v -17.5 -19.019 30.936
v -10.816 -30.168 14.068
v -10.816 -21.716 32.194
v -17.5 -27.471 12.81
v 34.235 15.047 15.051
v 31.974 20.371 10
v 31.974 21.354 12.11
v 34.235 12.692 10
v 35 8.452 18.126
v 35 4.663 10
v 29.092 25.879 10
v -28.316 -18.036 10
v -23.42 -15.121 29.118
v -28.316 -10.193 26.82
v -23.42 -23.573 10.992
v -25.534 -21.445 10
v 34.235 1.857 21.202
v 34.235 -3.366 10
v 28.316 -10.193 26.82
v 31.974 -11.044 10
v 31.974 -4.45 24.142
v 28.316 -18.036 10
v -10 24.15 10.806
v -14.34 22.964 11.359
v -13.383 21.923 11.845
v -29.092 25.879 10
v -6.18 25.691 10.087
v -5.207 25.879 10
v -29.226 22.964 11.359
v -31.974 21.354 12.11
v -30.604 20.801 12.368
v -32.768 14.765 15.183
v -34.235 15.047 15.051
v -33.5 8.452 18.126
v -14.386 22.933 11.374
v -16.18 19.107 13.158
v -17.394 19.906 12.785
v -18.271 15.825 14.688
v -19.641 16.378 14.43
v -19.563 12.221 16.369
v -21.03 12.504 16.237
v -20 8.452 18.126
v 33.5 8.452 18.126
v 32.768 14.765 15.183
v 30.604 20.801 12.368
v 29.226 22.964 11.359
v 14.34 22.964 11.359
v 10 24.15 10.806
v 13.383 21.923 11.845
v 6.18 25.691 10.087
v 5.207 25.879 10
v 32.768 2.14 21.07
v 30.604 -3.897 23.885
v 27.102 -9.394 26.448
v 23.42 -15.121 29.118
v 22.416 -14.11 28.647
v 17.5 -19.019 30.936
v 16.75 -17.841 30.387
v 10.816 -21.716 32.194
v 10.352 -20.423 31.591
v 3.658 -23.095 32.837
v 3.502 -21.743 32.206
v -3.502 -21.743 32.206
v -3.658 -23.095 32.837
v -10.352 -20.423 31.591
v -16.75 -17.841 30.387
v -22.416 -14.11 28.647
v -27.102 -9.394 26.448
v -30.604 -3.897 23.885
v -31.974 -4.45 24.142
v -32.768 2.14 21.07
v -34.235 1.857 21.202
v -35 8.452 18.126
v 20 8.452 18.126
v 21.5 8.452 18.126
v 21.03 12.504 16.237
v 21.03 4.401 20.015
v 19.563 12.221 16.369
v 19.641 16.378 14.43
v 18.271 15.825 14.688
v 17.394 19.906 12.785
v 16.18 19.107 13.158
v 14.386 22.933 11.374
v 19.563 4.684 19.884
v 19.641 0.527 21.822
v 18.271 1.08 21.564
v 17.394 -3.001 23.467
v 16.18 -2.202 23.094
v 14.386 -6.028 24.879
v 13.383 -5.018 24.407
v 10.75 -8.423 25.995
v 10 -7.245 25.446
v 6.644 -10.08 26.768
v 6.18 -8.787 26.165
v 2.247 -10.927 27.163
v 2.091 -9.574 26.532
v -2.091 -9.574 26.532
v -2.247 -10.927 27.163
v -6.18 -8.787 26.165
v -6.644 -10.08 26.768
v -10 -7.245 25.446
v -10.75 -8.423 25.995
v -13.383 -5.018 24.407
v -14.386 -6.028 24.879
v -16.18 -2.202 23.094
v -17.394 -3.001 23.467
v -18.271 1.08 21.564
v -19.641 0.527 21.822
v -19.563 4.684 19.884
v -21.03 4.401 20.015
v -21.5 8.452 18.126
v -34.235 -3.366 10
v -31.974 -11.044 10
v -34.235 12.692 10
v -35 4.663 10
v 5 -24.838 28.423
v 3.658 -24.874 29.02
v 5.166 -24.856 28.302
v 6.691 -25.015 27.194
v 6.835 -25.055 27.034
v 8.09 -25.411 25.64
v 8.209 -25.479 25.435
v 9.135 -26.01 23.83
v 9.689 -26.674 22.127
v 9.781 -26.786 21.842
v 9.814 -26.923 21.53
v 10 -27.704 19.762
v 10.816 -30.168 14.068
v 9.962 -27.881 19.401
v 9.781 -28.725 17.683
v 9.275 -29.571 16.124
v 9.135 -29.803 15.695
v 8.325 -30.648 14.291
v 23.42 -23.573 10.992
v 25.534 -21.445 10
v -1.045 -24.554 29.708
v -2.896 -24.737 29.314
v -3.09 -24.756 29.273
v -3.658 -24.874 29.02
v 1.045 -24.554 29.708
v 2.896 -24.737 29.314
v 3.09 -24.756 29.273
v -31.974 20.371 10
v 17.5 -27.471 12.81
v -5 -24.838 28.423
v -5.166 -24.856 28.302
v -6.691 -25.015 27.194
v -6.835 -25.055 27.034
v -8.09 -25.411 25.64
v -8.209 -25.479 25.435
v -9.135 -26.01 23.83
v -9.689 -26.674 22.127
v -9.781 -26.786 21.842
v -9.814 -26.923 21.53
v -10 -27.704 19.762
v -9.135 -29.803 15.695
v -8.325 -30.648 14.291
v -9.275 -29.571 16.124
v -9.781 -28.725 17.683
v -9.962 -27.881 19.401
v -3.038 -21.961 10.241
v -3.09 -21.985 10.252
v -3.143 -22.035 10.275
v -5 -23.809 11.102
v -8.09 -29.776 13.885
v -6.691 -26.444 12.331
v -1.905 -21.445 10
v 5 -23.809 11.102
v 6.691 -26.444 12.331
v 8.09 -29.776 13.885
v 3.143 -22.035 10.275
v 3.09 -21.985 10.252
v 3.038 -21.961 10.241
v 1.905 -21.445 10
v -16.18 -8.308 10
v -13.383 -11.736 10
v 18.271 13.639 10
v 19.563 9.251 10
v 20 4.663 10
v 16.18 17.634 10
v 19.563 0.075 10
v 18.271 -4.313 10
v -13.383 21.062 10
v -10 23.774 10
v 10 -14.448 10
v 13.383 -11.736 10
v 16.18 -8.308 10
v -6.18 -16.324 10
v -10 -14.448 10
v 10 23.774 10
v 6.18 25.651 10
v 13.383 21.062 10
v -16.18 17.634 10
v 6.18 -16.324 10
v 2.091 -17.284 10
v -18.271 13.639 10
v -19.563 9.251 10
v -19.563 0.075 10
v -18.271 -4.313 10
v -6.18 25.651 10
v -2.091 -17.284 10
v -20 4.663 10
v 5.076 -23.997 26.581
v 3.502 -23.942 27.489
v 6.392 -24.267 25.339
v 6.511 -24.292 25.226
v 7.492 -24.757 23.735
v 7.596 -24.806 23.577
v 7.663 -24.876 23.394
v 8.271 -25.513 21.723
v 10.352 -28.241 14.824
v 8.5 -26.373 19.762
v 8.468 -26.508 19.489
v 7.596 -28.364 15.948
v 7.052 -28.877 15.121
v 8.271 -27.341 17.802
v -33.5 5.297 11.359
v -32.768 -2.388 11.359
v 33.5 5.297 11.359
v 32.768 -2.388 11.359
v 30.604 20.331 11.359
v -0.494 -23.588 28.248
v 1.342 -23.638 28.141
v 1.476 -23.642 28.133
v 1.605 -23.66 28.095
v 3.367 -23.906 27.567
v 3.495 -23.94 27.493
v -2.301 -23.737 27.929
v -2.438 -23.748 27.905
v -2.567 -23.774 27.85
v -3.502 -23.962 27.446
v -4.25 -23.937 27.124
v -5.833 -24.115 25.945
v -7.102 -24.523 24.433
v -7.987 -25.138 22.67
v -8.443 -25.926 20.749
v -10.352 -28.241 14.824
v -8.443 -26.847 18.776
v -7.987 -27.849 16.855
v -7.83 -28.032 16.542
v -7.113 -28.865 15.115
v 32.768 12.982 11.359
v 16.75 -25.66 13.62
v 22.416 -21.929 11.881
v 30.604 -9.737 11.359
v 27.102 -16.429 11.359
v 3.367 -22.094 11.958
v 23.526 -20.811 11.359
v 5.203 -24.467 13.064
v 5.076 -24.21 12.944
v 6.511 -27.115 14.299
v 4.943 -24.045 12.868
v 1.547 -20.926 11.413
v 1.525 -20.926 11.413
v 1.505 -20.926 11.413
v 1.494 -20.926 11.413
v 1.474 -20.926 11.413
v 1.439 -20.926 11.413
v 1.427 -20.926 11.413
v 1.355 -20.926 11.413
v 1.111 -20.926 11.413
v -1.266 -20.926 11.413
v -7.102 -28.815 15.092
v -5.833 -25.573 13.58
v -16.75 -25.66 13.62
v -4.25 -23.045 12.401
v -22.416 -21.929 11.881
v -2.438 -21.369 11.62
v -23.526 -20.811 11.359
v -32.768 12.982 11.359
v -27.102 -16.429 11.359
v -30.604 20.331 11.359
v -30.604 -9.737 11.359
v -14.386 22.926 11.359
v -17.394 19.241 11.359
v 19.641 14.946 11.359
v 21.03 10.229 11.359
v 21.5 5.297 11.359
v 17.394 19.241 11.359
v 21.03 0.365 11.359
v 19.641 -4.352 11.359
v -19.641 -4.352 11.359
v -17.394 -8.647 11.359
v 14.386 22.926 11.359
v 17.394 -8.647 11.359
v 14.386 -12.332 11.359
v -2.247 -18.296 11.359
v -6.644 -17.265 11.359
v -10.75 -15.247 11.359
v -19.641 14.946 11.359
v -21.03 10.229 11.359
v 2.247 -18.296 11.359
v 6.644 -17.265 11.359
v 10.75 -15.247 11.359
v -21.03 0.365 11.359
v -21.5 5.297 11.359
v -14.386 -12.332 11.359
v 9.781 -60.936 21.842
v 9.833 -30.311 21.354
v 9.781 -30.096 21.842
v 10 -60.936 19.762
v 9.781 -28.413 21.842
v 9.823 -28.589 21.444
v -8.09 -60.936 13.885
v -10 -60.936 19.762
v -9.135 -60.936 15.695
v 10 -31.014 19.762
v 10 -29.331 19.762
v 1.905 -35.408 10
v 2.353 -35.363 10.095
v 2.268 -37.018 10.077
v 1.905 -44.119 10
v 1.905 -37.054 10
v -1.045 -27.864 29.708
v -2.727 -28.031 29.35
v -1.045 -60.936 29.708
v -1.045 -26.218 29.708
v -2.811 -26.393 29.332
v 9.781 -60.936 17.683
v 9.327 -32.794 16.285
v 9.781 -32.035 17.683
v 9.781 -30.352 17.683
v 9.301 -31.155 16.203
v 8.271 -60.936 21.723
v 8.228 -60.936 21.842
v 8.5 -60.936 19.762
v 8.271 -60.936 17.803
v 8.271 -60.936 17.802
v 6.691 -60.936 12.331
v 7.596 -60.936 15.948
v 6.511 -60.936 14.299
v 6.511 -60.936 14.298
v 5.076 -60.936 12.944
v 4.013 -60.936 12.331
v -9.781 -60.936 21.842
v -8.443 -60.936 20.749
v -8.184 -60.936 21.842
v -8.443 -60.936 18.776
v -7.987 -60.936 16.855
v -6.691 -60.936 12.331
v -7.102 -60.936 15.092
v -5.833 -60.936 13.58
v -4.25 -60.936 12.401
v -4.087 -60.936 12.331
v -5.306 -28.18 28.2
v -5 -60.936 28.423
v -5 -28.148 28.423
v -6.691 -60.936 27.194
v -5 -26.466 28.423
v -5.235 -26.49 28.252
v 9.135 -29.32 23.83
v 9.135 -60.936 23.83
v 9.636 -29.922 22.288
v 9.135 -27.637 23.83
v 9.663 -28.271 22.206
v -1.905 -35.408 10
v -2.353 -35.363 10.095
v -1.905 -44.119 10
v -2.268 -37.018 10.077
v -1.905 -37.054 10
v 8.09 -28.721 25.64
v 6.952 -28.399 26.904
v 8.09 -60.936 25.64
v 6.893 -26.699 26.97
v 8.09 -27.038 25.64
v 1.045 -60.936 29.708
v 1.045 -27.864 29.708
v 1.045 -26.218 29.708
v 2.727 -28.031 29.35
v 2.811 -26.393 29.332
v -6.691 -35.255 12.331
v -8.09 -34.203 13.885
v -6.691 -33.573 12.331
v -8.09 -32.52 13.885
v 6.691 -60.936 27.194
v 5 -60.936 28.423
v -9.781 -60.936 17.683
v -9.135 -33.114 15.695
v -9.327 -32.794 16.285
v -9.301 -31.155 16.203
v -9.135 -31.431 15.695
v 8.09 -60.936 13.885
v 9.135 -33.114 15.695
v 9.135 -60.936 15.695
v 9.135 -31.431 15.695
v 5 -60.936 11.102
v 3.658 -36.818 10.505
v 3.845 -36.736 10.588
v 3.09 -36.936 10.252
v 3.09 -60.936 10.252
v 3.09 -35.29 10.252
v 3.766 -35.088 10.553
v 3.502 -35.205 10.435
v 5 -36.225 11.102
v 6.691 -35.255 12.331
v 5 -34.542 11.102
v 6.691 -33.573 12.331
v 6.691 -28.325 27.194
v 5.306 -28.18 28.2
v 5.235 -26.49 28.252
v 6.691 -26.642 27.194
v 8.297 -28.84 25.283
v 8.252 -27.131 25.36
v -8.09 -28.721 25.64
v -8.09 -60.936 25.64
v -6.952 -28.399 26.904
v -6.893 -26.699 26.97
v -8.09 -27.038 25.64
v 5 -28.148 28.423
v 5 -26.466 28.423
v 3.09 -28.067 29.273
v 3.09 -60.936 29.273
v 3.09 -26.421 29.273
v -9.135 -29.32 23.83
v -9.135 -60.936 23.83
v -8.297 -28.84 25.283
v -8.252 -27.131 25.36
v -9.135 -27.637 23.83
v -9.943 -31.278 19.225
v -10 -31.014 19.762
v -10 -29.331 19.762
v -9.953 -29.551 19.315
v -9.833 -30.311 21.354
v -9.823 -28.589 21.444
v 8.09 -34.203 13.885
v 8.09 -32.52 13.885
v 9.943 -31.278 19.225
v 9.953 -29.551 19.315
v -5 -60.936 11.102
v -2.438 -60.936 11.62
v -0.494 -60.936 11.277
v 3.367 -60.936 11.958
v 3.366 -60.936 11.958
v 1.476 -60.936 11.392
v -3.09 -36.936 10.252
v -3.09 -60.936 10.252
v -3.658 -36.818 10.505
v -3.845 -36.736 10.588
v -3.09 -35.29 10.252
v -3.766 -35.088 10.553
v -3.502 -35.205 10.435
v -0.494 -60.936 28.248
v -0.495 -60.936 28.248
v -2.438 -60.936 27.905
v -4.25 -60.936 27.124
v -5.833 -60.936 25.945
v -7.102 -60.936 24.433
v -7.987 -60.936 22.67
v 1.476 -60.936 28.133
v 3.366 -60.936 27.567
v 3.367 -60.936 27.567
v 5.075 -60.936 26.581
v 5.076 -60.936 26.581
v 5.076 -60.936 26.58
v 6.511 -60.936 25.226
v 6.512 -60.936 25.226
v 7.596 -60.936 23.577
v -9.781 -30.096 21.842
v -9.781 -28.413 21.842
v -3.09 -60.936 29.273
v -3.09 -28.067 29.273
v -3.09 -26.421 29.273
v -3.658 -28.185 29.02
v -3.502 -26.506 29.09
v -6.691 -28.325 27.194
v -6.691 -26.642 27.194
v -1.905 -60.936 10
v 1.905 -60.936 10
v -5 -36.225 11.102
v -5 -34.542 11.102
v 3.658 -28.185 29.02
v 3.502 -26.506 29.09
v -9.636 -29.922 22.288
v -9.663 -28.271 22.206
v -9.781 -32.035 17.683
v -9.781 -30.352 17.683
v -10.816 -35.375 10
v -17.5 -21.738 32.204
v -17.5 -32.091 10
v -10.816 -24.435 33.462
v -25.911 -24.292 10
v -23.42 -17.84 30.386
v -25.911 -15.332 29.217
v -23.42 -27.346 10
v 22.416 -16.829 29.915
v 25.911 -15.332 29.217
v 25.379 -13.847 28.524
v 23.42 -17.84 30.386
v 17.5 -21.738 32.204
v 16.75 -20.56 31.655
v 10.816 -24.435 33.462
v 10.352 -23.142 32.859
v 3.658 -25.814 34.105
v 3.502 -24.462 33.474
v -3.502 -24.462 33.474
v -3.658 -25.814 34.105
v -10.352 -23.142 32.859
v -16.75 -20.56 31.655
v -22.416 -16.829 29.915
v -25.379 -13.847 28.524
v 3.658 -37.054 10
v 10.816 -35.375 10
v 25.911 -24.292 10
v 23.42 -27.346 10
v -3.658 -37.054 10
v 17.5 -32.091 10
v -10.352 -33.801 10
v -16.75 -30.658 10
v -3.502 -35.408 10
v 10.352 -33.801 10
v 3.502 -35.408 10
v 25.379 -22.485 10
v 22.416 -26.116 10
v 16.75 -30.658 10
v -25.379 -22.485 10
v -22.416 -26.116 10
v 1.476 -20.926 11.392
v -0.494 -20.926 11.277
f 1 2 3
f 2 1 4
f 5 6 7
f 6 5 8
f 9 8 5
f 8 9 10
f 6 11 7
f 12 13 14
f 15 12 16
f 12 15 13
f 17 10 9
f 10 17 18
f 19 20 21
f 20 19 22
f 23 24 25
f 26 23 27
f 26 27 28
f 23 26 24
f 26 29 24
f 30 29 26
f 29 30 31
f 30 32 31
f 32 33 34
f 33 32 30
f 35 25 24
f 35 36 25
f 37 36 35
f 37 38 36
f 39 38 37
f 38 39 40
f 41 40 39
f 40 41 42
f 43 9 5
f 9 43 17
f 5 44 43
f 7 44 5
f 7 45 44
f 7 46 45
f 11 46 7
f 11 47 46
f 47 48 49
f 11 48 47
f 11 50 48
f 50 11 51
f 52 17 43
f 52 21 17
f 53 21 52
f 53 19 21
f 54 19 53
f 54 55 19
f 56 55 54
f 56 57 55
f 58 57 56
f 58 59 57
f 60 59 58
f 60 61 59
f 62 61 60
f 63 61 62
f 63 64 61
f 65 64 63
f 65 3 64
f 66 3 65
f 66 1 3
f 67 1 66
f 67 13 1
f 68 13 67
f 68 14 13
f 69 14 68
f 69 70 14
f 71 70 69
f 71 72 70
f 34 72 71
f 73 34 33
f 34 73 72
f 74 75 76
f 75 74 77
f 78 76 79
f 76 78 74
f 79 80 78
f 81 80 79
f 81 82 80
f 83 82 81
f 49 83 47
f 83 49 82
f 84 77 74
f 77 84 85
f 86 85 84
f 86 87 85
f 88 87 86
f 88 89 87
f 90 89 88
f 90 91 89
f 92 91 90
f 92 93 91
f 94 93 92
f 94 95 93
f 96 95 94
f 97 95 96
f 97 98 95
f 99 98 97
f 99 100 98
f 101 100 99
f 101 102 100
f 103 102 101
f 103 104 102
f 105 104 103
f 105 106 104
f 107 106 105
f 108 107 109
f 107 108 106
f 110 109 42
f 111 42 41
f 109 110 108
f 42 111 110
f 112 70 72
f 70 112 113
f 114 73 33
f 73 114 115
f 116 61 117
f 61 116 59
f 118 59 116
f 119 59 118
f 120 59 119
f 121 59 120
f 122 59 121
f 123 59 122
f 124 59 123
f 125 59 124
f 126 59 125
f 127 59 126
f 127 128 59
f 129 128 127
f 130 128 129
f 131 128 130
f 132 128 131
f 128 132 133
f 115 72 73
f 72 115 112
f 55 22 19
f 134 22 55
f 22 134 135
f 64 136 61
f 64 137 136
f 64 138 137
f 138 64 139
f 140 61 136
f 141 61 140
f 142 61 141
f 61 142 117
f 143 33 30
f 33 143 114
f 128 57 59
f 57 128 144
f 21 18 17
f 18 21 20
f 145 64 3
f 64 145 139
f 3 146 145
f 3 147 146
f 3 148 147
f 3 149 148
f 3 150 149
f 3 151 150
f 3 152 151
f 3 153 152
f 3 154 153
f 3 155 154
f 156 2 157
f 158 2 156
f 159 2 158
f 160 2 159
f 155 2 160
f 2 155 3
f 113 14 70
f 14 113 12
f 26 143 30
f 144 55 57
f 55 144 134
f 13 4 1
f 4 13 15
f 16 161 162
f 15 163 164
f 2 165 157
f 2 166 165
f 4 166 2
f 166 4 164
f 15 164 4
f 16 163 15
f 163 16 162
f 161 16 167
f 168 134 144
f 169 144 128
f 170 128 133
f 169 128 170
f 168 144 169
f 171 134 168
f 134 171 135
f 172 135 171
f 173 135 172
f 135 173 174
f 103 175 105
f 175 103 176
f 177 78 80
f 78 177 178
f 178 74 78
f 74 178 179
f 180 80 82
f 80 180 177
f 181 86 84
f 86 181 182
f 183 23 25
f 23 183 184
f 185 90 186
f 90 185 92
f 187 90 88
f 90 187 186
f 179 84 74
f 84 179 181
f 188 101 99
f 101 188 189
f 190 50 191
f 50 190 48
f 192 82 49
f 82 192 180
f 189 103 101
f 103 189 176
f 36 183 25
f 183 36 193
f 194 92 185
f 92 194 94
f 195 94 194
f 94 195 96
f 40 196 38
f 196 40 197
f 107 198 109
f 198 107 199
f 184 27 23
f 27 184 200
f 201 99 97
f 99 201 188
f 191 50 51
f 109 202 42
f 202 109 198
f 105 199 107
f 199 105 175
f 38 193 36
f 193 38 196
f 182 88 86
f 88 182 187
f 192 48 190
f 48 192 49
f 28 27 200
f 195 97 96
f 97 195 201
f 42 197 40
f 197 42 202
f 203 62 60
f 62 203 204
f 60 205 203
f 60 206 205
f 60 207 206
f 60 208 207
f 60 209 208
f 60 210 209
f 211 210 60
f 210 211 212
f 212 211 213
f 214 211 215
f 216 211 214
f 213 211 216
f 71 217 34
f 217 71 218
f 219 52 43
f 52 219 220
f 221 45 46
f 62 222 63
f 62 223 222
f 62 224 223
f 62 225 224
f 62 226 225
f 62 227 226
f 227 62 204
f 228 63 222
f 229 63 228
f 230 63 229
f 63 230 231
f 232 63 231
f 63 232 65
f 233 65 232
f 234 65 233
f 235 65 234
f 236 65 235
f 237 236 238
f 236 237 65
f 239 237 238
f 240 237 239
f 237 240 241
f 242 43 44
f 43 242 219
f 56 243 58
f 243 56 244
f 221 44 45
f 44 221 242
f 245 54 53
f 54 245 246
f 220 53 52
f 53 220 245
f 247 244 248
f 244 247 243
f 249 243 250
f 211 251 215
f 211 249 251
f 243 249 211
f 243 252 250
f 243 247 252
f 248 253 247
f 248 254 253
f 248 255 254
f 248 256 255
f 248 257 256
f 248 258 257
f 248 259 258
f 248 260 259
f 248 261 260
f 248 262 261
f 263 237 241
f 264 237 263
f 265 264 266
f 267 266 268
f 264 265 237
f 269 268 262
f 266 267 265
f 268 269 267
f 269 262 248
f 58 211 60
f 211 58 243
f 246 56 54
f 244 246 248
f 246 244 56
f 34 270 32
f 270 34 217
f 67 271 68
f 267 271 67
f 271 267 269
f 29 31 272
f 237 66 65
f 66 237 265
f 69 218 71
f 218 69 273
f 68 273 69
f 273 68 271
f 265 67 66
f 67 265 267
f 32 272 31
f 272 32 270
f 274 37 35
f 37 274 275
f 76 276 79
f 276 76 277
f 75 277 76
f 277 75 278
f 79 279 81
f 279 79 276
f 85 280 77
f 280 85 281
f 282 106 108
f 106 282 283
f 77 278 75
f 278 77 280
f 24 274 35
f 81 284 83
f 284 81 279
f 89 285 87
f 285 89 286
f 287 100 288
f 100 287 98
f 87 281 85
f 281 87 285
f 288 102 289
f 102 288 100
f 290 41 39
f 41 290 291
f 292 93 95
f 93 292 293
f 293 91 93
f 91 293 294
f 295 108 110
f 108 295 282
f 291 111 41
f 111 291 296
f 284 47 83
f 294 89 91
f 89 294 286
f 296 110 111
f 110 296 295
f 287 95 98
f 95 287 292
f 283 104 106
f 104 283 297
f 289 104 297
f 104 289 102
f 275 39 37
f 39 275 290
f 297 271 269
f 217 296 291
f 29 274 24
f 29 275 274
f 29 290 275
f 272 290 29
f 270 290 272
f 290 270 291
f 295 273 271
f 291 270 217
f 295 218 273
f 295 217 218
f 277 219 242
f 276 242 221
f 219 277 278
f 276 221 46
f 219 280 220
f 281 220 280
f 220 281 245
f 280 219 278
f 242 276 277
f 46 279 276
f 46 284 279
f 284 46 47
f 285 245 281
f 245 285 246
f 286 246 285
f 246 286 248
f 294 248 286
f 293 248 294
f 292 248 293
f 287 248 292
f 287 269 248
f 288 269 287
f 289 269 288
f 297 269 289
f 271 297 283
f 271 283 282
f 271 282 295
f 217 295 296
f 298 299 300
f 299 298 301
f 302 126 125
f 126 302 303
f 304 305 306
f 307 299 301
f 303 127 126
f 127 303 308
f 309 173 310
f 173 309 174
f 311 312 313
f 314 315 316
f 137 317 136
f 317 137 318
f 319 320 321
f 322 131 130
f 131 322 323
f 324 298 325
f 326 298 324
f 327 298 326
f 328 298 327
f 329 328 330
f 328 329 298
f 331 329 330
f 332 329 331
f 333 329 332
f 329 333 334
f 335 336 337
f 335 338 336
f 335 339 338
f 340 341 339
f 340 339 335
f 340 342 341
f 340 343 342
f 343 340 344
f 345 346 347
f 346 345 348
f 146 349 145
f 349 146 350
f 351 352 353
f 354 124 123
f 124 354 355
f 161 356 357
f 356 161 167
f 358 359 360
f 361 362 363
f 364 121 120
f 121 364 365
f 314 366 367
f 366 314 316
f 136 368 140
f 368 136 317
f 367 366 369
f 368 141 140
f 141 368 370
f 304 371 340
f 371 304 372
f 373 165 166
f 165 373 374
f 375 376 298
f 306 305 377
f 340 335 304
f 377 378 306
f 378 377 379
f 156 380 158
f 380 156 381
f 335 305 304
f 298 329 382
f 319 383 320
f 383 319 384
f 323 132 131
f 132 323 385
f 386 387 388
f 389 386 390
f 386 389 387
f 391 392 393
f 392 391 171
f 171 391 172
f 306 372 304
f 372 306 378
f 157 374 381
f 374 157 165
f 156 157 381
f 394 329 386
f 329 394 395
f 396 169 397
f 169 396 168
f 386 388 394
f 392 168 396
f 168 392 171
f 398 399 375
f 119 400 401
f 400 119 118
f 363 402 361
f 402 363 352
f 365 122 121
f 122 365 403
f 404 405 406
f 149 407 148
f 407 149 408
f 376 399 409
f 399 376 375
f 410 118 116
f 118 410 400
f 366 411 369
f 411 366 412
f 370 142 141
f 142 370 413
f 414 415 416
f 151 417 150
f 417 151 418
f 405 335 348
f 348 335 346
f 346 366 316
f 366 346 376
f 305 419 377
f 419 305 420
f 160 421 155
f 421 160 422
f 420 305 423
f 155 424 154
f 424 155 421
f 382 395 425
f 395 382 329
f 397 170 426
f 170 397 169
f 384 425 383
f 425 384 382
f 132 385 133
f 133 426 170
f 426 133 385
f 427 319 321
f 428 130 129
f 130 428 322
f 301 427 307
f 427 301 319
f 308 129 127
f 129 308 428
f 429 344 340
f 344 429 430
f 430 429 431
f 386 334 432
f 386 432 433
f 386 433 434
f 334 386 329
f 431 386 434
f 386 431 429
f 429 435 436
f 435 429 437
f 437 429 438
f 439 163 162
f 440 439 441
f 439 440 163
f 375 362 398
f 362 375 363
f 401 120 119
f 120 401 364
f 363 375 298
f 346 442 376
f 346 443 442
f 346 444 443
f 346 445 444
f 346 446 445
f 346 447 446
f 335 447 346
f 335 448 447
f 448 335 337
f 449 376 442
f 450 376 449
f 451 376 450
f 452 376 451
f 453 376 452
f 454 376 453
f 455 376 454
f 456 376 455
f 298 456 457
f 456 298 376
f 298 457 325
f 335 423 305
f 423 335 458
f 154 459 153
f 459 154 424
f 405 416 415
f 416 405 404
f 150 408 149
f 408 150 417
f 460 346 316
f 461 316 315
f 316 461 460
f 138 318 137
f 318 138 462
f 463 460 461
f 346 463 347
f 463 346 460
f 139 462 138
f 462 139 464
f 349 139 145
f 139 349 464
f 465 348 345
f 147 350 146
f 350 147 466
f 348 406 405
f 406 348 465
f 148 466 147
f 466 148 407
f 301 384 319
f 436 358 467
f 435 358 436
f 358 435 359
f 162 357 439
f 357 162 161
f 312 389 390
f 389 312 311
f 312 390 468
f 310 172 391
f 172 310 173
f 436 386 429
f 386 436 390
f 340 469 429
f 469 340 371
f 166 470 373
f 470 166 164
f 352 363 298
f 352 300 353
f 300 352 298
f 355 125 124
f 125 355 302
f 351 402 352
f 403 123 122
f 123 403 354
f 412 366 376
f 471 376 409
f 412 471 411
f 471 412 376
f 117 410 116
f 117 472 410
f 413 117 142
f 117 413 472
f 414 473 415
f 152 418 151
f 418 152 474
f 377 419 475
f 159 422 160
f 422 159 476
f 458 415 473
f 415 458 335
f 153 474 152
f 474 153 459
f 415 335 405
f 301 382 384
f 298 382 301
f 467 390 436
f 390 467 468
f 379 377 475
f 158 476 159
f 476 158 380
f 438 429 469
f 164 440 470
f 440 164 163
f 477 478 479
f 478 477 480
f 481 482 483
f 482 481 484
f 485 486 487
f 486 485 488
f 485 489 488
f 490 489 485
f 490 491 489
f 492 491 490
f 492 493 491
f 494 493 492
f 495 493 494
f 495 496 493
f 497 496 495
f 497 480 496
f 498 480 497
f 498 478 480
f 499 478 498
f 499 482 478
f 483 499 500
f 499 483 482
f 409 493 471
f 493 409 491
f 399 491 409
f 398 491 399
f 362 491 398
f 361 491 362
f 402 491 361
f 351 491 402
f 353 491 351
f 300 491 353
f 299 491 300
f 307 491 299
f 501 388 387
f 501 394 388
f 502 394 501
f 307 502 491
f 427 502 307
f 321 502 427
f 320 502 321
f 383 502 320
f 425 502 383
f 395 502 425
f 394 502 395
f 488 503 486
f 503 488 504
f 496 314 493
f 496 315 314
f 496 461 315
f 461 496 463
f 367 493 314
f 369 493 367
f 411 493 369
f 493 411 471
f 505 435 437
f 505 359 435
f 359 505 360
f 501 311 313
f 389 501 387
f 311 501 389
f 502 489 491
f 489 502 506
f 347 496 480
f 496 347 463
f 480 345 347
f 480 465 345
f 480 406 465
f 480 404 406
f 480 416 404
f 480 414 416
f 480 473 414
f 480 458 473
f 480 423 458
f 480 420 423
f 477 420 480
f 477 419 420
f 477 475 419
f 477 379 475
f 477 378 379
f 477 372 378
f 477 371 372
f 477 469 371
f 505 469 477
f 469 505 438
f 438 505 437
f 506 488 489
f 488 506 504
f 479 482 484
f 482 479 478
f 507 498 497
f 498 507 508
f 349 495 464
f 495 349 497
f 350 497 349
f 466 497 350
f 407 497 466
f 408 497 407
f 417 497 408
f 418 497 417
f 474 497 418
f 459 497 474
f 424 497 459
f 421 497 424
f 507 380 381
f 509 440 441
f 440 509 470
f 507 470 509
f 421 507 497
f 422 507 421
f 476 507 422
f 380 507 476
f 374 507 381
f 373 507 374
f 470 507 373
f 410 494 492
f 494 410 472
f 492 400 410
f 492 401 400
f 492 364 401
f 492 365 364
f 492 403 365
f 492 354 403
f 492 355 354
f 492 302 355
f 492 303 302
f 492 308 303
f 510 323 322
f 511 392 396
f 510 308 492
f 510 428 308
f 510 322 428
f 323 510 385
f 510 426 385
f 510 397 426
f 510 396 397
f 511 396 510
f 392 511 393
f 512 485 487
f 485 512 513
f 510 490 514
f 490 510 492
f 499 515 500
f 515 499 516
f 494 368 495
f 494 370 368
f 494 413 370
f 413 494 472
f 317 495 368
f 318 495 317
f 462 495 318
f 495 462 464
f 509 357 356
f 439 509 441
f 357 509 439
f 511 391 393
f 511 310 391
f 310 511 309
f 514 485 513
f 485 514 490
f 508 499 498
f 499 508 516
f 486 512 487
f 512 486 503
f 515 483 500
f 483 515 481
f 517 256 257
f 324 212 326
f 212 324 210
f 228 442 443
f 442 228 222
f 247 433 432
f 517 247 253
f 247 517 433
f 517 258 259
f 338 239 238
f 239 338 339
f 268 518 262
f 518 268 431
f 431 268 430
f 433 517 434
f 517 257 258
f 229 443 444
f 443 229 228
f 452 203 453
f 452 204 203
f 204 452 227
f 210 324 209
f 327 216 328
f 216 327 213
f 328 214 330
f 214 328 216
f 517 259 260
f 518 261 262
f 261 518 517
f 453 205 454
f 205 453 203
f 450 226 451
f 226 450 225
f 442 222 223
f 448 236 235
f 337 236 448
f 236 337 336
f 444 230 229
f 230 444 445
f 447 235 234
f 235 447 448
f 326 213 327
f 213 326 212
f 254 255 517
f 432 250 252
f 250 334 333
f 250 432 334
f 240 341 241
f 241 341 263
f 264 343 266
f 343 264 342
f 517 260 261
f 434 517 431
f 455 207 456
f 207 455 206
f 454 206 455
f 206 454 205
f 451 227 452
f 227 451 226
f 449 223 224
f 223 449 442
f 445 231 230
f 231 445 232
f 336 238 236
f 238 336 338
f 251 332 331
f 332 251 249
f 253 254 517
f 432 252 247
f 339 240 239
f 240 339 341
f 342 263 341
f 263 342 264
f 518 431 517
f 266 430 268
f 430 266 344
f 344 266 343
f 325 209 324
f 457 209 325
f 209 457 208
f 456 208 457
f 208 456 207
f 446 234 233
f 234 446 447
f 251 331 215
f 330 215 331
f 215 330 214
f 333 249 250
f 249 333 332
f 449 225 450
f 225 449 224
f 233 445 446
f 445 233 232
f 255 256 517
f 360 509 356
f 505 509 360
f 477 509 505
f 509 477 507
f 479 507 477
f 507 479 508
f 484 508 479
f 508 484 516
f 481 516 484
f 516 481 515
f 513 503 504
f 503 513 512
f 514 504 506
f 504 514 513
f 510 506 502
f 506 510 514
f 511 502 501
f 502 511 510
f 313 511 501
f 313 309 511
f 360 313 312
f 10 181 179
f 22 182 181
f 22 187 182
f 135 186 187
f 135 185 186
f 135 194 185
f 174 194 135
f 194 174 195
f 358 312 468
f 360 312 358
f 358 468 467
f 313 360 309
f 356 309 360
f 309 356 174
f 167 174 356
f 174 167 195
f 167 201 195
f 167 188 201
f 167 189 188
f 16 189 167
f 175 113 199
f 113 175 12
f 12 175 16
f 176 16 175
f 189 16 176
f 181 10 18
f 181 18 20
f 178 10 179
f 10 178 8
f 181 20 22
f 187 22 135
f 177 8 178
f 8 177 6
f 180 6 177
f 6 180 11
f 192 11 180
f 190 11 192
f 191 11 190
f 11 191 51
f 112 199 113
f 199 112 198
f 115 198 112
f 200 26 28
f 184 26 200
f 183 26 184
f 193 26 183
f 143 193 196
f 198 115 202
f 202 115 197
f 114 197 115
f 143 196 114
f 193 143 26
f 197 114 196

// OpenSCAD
outer_diameter = 70;
wall_thickness = 1.5;
width = 15;
height = 20;
thin = 0.01;
angle = 25;

/* d = height / tan(angle);
p = (outer_diameter - d)/2; */
p=outer_diameter * 0.33;

rotate([-angle, 0, 0]) {
  assembly();
}

module mantle(){
  intersection(){
    translate([0,-outer_diameter/2,-height/2-thin])
      cylinder(d=outer_diameter-width, h=height*2);
    translate([0,-wall_thickness*2,-height/2])
      difference(){
        cylinder(d=outer_diameter,h=height*1.5);
        translate([0,0,-thin])
          cylinder(d=outer_diameter-wall_thickness*2,h=height*2);
      }
  }
}

module assembly(){
  difference() {
    union() {
      ringcup();
      outlet();
      mantle();
    }
    outlet_inner();
    cutoff();
  }

}

module outlet_inner(){
  translate([0,-p,0])
    rotate([90+angle,0,0])
      translate([0,height/2,0])
        translate([0,0,-thin])
          cylinder(d=height-wall_thickness*2,h=height*2+thin*2);
}

module outlet(){
  difference(){
    translate([0,-p,0])
      rotate([90+angle,0,0])
        translate([0,height/2,0])
          cylinder(d=height,h=height*2);
    outer();
  }
}

module cutoff(){
  rotate([angle, 0, 0])
  translate([-outer_diameter, -outer_diameter, -height]) {
    cube(size=[outer_diameter*2, outer_diameter*2, height*1.5]);
  }
}

module ringcup(){
  difference(){
    outer();
    translate([0, 0, wall_thickness]) {
      inner();
    }
  }
}

module outer(){
    difference(){
      cylinder(d=outer_diameter,h=height);
      translate([0,0,-thin])
        cylinder(d=outer_diameter-width*2,h=height+2*thin);
    }
}

module inner(){
    difference(){
      cylinder(d=outer_diameter-2*wall_thickness,h=height);
      translate([0,0,-thin])
        cylinder(d=outer_diameter-width*2+wall_thickness*2,h=height+2*thin);
        cutoff();
    }
}
